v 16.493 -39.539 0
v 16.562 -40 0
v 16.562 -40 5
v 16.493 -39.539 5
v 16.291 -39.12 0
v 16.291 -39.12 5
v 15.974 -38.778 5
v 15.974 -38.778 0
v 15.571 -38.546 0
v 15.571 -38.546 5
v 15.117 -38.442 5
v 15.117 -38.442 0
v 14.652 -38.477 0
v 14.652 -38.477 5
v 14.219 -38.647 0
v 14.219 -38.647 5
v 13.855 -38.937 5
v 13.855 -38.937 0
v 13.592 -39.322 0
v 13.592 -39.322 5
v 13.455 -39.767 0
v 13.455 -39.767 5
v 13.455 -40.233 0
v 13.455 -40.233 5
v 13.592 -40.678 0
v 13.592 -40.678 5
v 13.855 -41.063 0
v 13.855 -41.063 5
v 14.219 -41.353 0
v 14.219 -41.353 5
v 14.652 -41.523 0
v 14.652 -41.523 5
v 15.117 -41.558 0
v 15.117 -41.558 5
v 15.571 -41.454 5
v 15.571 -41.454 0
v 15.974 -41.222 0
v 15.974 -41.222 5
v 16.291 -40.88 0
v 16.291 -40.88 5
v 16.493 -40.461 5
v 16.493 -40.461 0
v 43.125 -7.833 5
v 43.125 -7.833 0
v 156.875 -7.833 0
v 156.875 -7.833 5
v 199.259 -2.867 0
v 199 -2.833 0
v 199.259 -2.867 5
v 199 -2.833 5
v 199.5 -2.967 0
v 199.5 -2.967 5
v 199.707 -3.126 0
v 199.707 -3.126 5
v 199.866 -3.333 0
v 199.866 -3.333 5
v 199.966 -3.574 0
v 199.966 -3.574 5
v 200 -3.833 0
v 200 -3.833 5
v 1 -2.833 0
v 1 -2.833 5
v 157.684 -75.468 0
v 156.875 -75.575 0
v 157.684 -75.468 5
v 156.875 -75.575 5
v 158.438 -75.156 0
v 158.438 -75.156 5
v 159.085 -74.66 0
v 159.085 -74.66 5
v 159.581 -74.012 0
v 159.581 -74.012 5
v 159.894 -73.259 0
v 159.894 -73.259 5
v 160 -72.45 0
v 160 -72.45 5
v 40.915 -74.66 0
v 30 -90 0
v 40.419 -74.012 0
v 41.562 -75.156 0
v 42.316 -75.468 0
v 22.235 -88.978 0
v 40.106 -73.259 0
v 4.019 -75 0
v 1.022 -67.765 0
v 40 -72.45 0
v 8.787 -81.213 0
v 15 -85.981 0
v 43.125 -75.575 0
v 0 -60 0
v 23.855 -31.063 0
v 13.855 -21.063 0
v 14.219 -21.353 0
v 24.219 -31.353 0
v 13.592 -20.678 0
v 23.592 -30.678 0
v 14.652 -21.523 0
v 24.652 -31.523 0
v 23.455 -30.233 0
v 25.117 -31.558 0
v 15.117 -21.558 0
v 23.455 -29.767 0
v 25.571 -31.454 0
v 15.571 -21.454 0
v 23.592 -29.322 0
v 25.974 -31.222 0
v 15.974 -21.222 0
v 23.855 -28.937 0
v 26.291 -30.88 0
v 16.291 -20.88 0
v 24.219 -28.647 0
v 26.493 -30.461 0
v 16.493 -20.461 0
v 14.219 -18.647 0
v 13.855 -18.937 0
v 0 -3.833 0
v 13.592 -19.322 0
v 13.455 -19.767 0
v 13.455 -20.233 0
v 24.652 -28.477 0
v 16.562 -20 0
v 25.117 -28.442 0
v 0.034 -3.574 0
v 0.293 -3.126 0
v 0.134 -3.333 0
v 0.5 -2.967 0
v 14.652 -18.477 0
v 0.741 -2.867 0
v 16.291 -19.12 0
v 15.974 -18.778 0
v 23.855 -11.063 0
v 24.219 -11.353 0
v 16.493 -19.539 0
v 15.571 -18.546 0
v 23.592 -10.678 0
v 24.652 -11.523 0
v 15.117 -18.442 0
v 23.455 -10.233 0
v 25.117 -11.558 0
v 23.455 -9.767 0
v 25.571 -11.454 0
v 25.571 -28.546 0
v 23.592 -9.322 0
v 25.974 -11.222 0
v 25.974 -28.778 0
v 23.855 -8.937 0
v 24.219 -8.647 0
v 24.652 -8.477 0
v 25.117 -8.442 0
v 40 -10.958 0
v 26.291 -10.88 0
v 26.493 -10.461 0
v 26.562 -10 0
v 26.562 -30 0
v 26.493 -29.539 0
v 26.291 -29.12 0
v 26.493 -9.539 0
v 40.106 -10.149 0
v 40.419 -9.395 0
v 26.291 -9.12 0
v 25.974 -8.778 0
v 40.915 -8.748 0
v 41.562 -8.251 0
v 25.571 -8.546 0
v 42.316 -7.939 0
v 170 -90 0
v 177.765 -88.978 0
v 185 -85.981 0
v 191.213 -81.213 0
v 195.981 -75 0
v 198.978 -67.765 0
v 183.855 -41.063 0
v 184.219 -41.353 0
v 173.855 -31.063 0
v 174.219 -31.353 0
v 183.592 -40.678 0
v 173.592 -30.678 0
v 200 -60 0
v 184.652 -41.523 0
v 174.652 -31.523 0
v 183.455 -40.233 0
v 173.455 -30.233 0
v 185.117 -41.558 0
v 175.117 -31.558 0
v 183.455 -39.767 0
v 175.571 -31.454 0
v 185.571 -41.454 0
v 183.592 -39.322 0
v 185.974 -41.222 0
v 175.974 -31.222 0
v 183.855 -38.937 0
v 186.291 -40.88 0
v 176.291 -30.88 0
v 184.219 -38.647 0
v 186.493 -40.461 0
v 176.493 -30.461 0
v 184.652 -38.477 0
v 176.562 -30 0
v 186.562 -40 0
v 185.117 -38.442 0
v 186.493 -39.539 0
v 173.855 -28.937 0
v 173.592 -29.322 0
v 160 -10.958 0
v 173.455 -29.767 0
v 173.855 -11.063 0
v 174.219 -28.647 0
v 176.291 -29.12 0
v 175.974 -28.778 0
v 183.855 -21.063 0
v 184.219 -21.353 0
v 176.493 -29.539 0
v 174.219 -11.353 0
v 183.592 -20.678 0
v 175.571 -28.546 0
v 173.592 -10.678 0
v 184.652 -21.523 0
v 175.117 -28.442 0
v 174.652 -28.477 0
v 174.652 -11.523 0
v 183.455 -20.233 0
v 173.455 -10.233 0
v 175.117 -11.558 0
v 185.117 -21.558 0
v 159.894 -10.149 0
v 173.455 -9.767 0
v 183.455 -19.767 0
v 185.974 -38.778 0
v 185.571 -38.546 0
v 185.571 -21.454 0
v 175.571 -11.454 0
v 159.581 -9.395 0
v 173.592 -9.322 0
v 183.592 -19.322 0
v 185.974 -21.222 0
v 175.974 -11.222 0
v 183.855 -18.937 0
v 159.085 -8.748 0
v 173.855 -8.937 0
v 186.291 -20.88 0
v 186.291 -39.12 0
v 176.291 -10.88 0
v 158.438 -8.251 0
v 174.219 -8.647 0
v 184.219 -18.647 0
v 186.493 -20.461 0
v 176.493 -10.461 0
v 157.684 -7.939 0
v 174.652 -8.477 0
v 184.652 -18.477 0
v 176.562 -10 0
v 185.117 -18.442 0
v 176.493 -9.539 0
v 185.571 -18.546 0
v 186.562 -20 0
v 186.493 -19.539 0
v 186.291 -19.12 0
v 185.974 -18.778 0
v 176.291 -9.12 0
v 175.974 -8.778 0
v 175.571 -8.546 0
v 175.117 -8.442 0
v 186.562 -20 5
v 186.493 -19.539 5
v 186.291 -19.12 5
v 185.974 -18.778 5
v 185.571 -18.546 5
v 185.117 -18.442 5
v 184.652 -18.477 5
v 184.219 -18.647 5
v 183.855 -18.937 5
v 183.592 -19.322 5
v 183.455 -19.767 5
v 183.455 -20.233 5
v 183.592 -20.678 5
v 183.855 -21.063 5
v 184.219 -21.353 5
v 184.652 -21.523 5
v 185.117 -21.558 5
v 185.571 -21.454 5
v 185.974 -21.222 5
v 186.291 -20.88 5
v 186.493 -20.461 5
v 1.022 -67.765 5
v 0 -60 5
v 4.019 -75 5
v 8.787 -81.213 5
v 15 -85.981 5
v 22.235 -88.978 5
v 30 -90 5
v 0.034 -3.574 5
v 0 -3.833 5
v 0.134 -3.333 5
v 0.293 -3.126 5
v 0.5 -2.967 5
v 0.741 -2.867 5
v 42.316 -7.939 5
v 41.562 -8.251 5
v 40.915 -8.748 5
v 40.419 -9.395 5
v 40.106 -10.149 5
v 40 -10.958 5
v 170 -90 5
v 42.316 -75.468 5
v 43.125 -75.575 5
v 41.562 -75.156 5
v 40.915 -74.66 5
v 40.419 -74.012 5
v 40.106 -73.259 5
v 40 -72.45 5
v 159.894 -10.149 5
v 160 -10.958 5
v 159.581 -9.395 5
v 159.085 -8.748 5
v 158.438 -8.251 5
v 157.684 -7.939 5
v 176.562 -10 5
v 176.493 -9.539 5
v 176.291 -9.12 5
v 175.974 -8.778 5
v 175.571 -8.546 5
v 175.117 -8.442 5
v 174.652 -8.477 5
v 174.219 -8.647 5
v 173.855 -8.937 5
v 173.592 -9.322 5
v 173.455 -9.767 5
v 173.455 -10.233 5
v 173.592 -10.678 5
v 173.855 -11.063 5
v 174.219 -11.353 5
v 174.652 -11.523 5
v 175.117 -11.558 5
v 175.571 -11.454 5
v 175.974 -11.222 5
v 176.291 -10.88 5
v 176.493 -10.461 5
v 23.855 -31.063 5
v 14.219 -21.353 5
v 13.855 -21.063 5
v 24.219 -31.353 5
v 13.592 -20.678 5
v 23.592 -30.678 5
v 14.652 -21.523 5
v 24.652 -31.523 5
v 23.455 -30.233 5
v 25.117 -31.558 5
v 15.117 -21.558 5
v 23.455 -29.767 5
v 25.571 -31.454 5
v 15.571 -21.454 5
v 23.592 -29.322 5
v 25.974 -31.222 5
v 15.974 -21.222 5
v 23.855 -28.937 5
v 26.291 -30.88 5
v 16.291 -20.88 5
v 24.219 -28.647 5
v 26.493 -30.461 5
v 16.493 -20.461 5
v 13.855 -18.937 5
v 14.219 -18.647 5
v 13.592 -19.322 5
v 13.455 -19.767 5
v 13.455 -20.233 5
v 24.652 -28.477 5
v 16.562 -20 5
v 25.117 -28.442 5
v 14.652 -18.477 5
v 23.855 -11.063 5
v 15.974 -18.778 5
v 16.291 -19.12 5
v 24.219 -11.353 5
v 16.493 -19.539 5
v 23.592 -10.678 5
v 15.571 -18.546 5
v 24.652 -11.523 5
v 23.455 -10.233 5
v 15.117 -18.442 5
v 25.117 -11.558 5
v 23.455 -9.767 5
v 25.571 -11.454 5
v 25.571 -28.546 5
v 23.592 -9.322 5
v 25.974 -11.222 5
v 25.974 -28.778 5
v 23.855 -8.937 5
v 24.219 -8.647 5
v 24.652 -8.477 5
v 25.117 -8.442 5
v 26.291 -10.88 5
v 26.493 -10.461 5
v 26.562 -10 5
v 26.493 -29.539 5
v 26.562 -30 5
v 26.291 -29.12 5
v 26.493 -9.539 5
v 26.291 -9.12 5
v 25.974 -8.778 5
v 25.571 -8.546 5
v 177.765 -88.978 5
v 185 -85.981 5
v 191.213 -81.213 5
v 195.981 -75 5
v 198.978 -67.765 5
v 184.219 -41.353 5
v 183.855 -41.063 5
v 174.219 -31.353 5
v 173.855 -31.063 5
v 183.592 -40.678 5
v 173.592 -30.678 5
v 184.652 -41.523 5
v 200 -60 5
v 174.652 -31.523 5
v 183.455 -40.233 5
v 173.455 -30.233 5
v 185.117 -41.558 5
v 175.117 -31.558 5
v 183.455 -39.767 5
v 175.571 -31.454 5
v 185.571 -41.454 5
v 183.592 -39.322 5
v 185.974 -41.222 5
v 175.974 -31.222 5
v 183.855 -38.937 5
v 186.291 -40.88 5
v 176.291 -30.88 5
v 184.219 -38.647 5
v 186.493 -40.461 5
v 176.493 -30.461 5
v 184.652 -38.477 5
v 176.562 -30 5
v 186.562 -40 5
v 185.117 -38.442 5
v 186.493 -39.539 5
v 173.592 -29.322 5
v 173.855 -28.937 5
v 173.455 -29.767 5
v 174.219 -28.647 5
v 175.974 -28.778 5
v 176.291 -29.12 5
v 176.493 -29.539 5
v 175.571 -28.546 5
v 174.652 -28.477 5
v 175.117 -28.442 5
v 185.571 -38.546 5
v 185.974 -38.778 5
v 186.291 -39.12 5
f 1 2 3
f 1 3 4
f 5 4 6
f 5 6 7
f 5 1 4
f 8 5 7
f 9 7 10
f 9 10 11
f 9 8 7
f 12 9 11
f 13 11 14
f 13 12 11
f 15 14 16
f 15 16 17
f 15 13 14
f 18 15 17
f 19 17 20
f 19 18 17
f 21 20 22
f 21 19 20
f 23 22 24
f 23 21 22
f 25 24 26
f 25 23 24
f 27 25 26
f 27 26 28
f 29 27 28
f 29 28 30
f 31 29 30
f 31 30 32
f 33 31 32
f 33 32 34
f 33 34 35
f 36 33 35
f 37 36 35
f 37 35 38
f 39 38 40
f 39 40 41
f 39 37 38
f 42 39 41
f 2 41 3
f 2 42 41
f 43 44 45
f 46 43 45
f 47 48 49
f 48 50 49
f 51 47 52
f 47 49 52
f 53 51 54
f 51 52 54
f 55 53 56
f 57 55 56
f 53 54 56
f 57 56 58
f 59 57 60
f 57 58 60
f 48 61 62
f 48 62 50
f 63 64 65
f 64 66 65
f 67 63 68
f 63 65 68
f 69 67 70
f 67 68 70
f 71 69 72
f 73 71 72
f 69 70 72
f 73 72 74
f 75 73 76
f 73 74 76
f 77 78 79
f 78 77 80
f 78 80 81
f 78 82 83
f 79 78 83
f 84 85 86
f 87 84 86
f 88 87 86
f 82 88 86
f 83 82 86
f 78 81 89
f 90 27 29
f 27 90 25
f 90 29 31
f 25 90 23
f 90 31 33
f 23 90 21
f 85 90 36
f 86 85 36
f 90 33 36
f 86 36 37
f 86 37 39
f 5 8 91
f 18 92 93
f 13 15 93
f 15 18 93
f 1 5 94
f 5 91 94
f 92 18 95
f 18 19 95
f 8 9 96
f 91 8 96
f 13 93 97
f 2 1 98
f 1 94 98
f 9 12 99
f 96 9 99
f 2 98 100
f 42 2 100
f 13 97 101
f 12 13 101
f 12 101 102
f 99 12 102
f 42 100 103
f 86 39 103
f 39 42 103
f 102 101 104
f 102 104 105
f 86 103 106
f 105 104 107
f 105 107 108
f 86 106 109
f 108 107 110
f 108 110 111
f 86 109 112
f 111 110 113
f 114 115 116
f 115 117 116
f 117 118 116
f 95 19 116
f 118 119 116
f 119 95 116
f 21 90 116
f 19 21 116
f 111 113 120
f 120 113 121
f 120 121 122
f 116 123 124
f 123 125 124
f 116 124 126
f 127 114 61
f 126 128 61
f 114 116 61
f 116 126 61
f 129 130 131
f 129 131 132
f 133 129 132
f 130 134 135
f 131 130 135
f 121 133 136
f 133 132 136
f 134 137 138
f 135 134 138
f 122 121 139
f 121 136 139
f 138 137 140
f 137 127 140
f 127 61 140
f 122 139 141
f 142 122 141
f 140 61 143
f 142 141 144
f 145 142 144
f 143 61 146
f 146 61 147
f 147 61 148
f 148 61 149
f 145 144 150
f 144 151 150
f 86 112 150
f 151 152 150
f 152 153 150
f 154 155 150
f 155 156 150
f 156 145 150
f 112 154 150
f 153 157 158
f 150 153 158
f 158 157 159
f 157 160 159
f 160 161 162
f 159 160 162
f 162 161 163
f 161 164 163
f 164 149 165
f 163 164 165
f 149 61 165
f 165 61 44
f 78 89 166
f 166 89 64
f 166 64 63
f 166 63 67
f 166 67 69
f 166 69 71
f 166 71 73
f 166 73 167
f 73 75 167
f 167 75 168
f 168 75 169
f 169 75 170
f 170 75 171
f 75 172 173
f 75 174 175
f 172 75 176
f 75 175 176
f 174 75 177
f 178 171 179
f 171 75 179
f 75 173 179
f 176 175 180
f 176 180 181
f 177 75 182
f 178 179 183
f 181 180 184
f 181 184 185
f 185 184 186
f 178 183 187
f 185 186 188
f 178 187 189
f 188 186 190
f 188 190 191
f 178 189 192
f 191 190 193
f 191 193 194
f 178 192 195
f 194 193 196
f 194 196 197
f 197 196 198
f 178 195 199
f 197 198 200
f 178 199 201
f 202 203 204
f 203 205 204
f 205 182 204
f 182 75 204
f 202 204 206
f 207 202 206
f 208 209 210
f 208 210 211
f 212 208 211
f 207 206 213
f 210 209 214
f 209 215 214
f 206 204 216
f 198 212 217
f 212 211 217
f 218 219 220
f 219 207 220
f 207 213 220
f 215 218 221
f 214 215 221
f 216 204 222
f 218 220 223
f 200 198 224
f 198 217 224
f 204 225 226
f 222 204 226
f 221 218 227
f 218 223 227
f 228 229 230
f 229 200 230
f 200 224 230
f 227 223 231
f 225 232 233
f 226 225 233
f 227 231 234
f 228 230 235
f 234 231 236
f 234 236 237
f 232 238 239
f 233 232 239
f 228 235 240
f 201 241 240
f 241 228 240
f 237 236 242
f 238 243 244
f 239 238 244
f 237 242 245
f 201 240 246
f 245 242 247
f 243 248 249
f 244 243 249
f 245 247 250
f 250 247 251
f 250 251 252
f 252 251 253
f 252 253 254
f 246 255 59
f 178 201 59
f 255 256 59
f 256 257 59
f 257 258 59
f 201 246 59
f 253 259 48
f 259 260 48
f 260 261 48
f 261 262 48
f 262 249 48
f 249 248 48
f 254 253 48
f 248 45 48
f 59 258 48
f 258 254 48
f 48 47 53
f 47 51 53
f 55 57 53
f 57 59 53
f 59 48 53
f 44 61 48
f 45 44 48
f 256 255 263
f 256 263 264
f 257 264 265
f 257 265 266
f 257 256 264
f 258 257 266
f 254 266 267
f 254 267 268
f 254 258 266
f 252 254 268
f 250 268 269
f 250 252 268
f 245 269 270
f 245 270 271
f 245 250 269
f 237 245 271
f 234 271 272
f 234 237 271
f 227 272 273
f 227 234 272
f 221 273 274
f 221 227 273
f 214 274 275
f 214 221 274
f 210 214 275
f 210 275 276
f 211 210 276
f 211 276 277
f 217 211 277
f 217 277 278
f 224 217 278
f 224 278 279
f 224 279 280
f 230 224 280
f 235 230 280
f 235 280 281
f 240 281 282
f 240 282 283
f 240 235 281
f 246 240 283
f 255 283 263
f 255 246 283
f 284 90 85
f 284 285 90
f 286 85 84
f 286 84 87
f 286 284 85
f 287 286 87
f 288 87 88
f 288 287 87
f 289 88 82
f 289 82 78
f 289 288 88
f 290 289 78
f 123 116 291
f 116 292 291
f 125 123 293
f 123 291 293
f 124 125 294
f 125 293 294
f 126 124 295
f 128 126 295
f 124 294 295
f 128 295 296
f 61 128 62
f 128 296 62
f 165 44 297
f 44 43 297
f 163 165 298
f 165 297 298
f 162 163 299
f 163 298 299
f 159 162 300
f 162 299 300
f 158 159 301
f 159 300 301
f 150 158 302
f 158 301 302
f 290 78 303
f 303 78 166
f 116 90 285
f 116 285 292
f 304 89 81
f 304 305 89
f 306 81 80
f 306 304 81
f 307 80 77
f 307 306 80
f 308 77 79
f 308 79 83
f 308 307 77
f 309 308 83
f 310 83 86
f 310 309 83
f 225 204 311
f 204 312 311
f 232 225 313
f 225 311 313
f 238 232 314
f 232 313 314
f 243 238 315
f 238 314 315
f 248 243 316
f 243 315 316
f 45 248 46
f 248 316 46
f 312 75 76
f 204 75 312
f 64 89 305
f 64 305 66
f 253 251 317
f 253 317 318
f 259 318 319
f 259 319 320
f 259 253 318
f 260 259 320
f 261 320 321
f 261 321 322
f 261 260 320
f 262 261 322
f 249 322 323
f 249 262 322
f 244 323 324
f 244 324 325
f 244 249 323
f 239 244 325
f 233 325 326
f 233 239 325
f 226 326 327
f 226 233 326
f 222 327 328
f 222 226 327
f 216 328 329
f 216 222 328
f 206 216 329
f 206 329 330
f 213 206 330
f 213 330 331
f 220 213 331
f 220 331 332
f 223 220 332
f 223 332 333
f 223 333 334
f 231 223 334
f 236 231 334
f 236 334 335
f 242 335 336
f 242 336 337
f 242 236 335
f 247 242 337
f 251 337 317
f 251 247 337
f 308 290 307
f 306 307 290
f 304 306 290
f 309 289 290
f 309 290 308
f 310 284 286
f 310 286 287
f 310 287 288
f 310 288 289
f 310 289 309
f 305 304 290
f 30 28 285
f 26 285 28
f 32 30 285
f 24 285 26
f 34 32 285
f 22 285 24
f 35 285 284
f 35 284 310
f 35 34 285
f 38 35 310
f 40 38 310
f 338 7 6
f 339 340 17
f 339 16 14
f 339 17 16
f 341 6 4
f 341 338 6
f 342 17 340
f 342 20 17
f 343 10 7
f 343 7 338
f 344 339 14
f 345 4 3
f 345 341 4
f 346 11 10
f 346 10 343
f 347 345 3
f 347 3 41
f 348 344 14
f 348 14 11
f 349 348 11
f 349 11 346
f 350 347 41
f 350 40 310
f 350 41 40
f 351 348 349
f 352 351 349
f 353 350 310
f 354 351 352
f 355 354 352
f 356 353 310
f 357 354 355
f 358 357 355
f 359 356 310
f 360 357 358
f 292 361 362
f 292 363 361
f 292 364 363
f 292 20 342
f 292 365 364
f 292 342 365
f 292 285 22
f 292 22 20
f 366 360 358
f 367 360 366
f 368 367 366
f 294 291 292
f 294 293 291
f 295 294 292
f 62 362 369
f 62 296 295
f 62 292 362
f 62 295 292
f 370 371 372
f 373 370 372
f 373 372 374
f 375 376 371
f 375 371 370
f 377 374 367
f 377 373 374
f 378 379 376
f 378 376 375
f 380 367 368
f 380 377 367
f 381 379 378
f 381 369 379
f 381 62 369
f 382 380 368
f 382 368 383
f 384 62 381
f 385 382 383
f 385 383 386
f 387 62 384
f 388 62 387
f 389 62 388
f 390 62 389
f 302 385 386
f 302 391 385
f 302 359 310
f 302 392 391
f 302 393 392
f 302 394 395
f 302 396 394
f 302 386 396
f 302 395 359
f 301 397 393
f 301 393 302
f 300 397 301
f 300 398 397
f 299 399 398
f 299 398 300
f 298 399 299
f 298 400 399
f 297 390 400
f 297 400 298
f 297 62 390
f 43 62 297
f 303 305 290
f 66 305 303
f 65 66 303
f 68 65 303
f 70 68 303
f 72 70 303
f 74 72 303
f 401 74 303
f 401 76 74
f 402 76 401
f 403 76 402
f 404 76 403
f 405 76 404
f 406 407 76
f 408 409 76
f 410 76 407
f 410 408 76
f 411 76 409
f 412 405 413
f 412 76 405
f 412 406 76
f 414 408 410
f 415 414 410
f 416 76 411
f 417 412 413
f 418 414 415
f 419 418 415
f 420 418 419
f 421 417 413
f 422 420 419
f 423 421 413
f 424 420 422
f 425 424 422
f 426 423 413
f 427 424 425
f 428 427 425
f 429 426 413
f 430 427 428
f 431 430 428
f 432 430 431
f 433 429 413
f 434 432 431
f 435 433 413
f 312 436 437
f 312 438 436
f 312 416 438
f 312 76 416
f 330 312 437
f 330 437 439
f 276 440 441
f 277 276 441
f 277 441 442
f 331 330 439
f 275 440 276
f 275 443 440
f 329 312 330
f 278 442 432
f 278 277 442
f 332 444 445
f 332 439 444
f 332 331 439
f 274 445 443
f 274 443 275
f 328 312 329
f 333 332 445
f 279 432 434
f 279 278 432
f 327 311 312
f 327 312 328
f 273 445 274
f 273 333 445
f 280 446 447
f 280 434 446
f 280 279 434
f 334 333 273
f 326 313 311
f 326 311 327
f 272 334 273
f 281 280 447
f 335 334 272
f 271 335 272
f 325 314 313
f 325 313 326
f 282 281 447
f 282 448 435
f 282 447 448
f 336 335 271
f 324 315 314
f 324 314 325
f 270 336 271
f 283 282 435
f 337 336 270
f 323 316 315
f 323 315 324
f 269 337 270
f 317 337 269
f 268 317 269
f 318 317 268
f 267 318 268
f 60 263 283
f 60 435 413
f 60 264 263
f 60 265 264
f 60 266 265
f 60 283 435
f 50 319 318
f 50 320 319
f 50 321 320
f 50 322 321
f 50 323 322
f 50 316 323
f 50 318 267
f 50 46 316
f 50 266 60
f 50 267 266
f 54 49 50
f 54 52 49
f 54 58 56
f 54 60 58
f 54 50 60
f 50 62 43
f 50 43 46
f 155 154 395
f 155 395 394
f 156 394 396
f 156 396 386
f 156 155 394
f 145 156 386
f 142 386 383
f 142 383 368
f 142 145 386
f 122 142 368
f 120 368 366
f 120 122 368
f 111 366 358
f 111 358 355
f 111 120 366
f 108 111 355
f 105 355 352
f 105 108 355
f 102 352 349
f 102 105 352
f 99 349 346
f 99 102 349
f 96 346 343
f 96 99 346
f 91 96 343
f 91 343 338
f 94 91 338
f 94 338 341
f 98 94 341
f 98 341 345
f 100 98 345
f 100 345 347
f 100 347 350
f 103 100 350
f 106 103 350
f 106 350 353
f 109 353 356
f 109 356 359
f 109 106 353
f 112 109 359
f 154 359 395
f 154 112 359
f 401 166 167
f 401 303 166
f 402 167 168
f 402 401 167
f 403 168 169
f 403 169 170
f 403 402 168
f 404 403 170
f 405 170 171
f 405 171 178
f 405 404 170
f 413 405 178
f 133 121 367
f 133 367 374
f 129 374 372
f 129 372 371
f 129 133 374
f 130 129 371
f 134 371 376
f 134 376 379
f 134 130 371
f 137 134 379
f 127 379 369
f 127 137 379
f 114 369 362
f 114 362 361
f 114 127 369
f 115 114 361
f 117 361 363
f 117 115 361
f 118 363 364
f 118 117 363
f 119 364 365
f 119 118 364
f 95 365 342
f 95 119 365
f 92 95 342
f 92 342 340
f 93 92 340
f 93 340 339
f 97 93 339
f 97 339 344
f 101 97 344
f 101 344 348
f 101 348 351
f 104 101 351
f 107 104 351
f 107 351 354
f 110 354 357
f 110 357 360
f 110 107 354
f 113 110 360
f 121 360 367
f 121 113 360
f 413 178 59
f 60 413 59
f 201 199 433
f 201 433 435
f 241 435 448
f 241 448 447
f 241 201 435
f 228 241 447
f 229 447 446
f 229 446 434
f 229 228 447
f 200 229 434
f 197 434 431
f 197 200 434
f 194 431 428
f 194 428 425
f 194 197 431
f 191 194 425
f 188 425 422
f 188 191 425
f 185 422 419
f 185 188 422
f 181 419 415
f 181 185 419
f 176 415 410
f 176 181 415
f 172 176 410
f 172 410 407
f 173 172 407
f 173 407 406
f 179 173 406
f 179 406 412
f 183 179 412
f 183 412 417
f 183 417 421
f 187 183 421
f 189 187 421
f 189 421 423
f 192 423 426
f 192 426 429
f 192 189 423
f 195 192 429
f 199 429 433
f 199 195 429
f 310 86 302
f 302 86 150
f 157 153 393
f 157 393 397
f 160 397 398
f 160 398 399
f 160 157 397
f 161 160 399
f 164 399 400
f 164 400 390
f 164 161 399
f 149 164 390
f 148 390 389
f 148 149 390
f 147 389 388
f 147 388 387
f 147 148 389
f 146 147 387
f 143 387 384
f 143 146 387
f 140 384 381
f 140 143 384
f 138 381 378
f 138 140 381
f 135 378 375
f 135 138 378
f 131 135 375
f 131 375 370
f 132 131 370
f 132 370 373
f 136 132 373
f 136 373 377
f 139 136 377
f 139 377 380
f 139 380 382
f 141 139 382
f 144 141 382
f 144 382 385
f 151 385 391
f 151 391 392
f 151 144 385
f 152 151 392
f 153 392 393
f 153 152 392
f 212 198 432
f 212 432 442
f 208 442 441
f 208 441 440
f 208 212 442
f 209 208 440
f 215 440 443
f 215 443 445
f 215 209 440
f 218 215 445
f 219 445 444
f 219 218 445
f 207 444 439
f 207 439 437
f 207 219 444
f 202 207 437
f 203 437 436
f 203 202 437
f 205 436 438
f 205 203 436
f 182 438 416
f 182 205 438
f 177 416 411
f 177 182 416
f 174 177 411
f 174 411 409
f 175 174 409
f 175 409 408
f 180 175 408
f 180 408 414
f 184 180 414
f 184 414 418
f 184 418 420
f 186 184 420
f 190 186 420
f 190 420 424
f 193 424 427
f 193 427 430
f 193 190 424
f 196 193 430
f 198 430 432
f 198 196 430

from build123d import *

# Parameters (mm, degrees)
SKETCH_W    = 200
SKETCH_H    = 87.167173
SKETCH_R    = 1.5625
SKETCH_W_2  = 120
SKETCH_H_2  = 67.742155
PAD_DEPTH   = 5
FILLET_R    = 30
FILLET001_R = 3.125
FILLET002_R = 1


with BuildPart() as part:
    # Sketch → Pad (new body)
    with BuildSketch(Plane.XY):
        with Locations((100, -46.416413)):
            Rectangle(SKETCH_W, SKETCH_H)
        with Locations((175, -10)):
            Circle(SKETCH_R, mode=Mode.SUBTRACT)
        with Locations((175, -30)):
            Circle(SKETCH_R, mode=Mode.SUBTRACT)
        with Locations((185, -20)):
            Circle(SKETCH_R, mode=Mode.SUBTRACT)
        with Locations((185, -40)):
            Circle(SKETCH_R, mode=Mode.SUBTRACT)
        with Locations((25, -10)):
            Circle(SKETCH_R, mode=Mode.SUBTRACT)
        with Locations((25, -30)):
            Circle(SKETCH_R, mode=Mode.SUBTRACT)
        with Locations((15, -20)):
            Circle(SKETCH_R, mode=Mode.SUBTRACT)
        with Locations((15, -40)):
            Circle(SKETCH_R, mode=Mode.SUBTRACT)
        with Locations((100, -41.703904)):
            Rectangle(SKETCH_W_2, SKETCH_H_2, mode=Mode.SUBTRACT)
    extrude(amount=PAD_DEPTH)

    # Fillet
    fillet_edges = [part.edges().sort_by_distance(p)[0] for p in [
        (200, -90, 2.5),
        (0, -90, 2.5),
    ]]
    fillet(fillet_edges, radius=FILLET_R)

    # Fillet001
    fillet001_edges = [part.edges().sort_by_distance(p)[0] for p in [
        (40, -7.832827, 2.5),
        (160, -7.832827, 2.5),
        (160, -75.574982, 2.5),
        (40, -75.574982, 2.5),
    ]]
    fillet(fillet001_edges, radius=FILLET001_R)

    # Fillet002
    fillet002_edges = [part.edges().sort_by_distance(p)[0] for p in [
        (0, -2.832827, 2.5),
        (200, -2.832827, 2.5),
    ]]
    fillet(fillet002_edges, radius=FILLET002_R)


solid = part.part
